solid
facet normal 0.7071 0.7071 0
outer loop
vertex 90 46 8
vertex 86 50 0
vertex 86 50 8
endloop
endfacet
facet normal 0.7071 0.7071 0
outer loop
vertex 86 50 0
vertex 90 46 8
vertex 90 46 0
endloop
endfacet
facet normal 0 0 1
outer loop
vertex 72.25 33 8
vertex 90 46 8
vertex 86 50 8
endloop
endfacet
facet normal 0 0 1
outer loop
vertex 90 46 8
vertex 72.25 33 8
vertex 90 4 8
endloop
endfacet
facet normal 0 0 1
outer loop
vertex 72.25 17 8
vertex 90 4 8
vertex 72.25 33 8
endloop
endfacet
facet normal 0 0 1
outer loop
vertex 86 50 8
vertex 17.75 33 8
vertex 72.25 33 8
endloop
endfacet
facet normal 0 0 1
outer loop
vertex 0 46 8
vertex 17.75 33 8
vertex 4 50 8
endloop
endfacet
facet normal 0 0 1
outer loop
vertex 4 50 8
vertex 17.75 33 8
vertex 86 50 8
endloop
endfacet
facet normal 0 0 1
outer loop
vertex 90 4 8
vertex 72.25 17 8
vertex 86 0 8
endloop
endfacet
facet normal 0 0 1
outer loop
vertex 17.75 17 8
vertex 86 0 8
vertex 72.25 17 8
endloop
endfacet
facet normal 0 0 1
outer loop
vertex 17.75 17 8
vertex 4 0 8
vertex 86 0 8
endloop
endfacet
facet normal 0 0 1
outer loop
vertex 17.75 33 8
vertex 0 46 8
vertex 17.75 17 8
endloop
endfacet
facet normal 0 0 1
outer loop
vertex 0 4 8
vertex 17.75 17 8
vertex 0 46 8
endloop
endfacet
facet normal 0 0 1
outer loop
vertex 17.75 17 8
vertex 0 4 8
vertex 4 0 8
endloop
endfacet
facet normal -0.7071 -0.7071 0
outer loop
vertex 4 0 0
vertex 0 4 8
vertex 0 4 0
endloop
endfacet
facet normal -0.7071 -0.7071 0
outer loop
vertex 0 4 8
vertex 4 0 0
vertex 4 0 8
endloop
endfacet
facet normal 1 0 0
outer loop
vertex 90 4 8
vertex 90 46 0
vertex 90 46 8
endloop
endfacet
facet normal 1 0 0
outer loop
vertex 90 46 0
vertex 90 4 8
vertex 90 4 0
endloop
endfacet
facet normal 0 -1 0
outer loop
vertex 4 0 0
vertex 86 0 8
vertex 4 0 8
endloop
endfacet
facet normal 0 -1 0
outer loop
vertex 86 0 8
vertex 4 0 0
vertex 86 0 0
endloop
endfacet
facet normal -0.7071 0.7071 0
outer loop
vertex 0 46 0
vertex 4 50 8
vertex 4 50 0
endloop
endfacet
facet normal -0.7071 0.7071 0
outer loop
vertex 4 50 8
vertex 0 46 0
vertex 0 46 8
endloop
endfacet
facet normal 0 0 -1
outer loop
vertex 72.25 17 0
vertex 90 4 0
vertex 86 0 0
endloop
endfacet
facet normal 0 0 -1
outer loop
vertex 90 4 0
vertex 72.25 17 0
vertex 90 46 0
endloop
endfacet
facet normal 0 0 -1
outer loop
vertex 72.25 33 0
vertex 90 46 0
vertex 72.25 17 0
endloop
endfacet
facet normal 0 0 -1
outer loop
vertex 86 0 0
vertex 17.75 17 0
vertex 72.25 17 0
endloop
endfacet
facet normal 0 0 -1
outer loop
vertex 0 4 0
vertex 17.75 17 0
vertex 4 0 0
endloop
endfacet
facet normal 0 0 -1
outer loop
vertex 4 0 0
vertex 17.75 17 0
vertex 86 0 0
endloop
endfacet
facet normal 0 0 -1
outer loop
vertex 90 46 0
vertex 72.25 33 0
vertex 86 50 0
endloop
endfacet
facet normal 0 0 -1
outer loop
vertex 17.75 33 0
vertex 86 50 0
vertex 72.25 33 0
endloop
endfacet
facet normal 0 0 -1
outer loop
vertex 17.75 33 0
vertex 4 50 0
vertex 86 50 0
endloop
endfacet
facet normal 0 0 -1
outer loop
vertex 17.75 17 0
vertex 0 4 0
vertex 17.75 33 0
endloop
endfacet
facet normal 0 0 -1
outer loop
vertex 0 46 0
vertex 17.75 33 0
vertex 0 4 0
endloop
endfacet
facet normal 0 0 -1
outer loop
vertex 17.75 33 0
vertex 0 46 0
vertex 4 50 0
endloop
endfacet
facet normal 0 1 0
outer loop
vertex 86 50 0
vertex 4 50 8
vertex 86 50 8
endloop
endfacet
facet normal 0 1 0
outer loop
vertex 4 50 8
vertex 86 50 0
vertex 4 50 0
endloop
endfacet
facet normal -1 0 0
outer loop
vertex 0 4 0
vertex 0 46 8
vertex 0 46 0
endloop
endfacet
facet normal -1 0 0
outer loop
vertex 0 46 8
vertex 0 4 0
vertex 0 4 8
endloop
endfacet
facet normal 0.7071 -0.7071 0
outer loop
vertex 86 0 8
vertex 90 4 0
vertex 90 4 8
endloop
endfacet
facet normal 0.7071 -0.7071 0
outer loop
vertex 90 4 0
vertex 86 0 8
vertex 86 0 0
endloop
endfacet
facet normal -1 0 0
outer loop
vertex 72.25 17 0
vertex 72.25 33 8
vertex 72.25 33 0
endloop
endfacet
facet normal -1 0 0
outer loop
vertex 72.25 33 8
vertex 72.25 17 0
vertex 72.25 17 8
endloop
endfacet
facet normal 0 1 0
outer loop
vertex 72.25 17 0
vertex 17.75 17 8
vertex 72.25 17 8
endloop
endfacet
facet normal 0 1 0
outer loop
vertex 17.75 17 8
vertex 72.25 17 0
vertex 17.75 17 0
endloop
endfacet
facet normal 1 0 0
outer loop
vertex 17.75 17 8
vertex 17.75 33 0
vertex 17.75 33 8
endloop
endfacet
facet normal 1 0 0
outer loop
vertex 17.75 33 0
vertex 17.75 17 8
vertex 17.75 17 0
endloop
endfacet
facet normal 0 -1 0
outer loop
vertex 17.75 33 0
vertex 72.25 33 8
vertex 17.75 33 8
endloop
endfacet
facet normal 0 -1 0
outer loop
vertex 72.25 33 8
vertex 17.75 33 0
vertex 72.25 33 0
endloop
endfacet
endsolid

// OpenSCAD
$fn = 32;

// ----------------------------------------------------------------------
// Windowed plate: 1 voids, 90 x 50 x 8 mm
// ----------------------------------------------------------------------

// --- parameters (mm) ---
plate_l = 90;             // plate length, X
plate_w = 50;             // plate width, Y
plate_t = 8;              // plate thickness, Z
edge_margin = 12;         // wall from the plate edge to any window
win1_l = 54.5;            // window length
win1_w = 16;              // window width
depth_1 = 8;              // depth of void 1 (full thickness = through)
corner_c = 4;             // corner chamfer of the plate
fit_tol = 0.1;            // declared fit tolerance (prompt contract)
free_tol = 0.5;           // declared free tolerance (prompt contract)

profile = [[4, 0], [86, 0], [90, 4], [90, 46], [86, 50], [4, 50], [0, 46], [0, 4]];  // primary outline, 8 points, counter clockwise
void_1 = [[17.75, 17], [72.25, 17], [72.25, 33], [17.75, 33]];  // large central window, 4 points

// --- the one profile operation ---
difference() {
  linear_extrude(height = plate_t) polygon(points = profile);
  translate([0, 0, -1])
    linear_extrude(height = plate_t + 2) polygon(points = void_1);
}
